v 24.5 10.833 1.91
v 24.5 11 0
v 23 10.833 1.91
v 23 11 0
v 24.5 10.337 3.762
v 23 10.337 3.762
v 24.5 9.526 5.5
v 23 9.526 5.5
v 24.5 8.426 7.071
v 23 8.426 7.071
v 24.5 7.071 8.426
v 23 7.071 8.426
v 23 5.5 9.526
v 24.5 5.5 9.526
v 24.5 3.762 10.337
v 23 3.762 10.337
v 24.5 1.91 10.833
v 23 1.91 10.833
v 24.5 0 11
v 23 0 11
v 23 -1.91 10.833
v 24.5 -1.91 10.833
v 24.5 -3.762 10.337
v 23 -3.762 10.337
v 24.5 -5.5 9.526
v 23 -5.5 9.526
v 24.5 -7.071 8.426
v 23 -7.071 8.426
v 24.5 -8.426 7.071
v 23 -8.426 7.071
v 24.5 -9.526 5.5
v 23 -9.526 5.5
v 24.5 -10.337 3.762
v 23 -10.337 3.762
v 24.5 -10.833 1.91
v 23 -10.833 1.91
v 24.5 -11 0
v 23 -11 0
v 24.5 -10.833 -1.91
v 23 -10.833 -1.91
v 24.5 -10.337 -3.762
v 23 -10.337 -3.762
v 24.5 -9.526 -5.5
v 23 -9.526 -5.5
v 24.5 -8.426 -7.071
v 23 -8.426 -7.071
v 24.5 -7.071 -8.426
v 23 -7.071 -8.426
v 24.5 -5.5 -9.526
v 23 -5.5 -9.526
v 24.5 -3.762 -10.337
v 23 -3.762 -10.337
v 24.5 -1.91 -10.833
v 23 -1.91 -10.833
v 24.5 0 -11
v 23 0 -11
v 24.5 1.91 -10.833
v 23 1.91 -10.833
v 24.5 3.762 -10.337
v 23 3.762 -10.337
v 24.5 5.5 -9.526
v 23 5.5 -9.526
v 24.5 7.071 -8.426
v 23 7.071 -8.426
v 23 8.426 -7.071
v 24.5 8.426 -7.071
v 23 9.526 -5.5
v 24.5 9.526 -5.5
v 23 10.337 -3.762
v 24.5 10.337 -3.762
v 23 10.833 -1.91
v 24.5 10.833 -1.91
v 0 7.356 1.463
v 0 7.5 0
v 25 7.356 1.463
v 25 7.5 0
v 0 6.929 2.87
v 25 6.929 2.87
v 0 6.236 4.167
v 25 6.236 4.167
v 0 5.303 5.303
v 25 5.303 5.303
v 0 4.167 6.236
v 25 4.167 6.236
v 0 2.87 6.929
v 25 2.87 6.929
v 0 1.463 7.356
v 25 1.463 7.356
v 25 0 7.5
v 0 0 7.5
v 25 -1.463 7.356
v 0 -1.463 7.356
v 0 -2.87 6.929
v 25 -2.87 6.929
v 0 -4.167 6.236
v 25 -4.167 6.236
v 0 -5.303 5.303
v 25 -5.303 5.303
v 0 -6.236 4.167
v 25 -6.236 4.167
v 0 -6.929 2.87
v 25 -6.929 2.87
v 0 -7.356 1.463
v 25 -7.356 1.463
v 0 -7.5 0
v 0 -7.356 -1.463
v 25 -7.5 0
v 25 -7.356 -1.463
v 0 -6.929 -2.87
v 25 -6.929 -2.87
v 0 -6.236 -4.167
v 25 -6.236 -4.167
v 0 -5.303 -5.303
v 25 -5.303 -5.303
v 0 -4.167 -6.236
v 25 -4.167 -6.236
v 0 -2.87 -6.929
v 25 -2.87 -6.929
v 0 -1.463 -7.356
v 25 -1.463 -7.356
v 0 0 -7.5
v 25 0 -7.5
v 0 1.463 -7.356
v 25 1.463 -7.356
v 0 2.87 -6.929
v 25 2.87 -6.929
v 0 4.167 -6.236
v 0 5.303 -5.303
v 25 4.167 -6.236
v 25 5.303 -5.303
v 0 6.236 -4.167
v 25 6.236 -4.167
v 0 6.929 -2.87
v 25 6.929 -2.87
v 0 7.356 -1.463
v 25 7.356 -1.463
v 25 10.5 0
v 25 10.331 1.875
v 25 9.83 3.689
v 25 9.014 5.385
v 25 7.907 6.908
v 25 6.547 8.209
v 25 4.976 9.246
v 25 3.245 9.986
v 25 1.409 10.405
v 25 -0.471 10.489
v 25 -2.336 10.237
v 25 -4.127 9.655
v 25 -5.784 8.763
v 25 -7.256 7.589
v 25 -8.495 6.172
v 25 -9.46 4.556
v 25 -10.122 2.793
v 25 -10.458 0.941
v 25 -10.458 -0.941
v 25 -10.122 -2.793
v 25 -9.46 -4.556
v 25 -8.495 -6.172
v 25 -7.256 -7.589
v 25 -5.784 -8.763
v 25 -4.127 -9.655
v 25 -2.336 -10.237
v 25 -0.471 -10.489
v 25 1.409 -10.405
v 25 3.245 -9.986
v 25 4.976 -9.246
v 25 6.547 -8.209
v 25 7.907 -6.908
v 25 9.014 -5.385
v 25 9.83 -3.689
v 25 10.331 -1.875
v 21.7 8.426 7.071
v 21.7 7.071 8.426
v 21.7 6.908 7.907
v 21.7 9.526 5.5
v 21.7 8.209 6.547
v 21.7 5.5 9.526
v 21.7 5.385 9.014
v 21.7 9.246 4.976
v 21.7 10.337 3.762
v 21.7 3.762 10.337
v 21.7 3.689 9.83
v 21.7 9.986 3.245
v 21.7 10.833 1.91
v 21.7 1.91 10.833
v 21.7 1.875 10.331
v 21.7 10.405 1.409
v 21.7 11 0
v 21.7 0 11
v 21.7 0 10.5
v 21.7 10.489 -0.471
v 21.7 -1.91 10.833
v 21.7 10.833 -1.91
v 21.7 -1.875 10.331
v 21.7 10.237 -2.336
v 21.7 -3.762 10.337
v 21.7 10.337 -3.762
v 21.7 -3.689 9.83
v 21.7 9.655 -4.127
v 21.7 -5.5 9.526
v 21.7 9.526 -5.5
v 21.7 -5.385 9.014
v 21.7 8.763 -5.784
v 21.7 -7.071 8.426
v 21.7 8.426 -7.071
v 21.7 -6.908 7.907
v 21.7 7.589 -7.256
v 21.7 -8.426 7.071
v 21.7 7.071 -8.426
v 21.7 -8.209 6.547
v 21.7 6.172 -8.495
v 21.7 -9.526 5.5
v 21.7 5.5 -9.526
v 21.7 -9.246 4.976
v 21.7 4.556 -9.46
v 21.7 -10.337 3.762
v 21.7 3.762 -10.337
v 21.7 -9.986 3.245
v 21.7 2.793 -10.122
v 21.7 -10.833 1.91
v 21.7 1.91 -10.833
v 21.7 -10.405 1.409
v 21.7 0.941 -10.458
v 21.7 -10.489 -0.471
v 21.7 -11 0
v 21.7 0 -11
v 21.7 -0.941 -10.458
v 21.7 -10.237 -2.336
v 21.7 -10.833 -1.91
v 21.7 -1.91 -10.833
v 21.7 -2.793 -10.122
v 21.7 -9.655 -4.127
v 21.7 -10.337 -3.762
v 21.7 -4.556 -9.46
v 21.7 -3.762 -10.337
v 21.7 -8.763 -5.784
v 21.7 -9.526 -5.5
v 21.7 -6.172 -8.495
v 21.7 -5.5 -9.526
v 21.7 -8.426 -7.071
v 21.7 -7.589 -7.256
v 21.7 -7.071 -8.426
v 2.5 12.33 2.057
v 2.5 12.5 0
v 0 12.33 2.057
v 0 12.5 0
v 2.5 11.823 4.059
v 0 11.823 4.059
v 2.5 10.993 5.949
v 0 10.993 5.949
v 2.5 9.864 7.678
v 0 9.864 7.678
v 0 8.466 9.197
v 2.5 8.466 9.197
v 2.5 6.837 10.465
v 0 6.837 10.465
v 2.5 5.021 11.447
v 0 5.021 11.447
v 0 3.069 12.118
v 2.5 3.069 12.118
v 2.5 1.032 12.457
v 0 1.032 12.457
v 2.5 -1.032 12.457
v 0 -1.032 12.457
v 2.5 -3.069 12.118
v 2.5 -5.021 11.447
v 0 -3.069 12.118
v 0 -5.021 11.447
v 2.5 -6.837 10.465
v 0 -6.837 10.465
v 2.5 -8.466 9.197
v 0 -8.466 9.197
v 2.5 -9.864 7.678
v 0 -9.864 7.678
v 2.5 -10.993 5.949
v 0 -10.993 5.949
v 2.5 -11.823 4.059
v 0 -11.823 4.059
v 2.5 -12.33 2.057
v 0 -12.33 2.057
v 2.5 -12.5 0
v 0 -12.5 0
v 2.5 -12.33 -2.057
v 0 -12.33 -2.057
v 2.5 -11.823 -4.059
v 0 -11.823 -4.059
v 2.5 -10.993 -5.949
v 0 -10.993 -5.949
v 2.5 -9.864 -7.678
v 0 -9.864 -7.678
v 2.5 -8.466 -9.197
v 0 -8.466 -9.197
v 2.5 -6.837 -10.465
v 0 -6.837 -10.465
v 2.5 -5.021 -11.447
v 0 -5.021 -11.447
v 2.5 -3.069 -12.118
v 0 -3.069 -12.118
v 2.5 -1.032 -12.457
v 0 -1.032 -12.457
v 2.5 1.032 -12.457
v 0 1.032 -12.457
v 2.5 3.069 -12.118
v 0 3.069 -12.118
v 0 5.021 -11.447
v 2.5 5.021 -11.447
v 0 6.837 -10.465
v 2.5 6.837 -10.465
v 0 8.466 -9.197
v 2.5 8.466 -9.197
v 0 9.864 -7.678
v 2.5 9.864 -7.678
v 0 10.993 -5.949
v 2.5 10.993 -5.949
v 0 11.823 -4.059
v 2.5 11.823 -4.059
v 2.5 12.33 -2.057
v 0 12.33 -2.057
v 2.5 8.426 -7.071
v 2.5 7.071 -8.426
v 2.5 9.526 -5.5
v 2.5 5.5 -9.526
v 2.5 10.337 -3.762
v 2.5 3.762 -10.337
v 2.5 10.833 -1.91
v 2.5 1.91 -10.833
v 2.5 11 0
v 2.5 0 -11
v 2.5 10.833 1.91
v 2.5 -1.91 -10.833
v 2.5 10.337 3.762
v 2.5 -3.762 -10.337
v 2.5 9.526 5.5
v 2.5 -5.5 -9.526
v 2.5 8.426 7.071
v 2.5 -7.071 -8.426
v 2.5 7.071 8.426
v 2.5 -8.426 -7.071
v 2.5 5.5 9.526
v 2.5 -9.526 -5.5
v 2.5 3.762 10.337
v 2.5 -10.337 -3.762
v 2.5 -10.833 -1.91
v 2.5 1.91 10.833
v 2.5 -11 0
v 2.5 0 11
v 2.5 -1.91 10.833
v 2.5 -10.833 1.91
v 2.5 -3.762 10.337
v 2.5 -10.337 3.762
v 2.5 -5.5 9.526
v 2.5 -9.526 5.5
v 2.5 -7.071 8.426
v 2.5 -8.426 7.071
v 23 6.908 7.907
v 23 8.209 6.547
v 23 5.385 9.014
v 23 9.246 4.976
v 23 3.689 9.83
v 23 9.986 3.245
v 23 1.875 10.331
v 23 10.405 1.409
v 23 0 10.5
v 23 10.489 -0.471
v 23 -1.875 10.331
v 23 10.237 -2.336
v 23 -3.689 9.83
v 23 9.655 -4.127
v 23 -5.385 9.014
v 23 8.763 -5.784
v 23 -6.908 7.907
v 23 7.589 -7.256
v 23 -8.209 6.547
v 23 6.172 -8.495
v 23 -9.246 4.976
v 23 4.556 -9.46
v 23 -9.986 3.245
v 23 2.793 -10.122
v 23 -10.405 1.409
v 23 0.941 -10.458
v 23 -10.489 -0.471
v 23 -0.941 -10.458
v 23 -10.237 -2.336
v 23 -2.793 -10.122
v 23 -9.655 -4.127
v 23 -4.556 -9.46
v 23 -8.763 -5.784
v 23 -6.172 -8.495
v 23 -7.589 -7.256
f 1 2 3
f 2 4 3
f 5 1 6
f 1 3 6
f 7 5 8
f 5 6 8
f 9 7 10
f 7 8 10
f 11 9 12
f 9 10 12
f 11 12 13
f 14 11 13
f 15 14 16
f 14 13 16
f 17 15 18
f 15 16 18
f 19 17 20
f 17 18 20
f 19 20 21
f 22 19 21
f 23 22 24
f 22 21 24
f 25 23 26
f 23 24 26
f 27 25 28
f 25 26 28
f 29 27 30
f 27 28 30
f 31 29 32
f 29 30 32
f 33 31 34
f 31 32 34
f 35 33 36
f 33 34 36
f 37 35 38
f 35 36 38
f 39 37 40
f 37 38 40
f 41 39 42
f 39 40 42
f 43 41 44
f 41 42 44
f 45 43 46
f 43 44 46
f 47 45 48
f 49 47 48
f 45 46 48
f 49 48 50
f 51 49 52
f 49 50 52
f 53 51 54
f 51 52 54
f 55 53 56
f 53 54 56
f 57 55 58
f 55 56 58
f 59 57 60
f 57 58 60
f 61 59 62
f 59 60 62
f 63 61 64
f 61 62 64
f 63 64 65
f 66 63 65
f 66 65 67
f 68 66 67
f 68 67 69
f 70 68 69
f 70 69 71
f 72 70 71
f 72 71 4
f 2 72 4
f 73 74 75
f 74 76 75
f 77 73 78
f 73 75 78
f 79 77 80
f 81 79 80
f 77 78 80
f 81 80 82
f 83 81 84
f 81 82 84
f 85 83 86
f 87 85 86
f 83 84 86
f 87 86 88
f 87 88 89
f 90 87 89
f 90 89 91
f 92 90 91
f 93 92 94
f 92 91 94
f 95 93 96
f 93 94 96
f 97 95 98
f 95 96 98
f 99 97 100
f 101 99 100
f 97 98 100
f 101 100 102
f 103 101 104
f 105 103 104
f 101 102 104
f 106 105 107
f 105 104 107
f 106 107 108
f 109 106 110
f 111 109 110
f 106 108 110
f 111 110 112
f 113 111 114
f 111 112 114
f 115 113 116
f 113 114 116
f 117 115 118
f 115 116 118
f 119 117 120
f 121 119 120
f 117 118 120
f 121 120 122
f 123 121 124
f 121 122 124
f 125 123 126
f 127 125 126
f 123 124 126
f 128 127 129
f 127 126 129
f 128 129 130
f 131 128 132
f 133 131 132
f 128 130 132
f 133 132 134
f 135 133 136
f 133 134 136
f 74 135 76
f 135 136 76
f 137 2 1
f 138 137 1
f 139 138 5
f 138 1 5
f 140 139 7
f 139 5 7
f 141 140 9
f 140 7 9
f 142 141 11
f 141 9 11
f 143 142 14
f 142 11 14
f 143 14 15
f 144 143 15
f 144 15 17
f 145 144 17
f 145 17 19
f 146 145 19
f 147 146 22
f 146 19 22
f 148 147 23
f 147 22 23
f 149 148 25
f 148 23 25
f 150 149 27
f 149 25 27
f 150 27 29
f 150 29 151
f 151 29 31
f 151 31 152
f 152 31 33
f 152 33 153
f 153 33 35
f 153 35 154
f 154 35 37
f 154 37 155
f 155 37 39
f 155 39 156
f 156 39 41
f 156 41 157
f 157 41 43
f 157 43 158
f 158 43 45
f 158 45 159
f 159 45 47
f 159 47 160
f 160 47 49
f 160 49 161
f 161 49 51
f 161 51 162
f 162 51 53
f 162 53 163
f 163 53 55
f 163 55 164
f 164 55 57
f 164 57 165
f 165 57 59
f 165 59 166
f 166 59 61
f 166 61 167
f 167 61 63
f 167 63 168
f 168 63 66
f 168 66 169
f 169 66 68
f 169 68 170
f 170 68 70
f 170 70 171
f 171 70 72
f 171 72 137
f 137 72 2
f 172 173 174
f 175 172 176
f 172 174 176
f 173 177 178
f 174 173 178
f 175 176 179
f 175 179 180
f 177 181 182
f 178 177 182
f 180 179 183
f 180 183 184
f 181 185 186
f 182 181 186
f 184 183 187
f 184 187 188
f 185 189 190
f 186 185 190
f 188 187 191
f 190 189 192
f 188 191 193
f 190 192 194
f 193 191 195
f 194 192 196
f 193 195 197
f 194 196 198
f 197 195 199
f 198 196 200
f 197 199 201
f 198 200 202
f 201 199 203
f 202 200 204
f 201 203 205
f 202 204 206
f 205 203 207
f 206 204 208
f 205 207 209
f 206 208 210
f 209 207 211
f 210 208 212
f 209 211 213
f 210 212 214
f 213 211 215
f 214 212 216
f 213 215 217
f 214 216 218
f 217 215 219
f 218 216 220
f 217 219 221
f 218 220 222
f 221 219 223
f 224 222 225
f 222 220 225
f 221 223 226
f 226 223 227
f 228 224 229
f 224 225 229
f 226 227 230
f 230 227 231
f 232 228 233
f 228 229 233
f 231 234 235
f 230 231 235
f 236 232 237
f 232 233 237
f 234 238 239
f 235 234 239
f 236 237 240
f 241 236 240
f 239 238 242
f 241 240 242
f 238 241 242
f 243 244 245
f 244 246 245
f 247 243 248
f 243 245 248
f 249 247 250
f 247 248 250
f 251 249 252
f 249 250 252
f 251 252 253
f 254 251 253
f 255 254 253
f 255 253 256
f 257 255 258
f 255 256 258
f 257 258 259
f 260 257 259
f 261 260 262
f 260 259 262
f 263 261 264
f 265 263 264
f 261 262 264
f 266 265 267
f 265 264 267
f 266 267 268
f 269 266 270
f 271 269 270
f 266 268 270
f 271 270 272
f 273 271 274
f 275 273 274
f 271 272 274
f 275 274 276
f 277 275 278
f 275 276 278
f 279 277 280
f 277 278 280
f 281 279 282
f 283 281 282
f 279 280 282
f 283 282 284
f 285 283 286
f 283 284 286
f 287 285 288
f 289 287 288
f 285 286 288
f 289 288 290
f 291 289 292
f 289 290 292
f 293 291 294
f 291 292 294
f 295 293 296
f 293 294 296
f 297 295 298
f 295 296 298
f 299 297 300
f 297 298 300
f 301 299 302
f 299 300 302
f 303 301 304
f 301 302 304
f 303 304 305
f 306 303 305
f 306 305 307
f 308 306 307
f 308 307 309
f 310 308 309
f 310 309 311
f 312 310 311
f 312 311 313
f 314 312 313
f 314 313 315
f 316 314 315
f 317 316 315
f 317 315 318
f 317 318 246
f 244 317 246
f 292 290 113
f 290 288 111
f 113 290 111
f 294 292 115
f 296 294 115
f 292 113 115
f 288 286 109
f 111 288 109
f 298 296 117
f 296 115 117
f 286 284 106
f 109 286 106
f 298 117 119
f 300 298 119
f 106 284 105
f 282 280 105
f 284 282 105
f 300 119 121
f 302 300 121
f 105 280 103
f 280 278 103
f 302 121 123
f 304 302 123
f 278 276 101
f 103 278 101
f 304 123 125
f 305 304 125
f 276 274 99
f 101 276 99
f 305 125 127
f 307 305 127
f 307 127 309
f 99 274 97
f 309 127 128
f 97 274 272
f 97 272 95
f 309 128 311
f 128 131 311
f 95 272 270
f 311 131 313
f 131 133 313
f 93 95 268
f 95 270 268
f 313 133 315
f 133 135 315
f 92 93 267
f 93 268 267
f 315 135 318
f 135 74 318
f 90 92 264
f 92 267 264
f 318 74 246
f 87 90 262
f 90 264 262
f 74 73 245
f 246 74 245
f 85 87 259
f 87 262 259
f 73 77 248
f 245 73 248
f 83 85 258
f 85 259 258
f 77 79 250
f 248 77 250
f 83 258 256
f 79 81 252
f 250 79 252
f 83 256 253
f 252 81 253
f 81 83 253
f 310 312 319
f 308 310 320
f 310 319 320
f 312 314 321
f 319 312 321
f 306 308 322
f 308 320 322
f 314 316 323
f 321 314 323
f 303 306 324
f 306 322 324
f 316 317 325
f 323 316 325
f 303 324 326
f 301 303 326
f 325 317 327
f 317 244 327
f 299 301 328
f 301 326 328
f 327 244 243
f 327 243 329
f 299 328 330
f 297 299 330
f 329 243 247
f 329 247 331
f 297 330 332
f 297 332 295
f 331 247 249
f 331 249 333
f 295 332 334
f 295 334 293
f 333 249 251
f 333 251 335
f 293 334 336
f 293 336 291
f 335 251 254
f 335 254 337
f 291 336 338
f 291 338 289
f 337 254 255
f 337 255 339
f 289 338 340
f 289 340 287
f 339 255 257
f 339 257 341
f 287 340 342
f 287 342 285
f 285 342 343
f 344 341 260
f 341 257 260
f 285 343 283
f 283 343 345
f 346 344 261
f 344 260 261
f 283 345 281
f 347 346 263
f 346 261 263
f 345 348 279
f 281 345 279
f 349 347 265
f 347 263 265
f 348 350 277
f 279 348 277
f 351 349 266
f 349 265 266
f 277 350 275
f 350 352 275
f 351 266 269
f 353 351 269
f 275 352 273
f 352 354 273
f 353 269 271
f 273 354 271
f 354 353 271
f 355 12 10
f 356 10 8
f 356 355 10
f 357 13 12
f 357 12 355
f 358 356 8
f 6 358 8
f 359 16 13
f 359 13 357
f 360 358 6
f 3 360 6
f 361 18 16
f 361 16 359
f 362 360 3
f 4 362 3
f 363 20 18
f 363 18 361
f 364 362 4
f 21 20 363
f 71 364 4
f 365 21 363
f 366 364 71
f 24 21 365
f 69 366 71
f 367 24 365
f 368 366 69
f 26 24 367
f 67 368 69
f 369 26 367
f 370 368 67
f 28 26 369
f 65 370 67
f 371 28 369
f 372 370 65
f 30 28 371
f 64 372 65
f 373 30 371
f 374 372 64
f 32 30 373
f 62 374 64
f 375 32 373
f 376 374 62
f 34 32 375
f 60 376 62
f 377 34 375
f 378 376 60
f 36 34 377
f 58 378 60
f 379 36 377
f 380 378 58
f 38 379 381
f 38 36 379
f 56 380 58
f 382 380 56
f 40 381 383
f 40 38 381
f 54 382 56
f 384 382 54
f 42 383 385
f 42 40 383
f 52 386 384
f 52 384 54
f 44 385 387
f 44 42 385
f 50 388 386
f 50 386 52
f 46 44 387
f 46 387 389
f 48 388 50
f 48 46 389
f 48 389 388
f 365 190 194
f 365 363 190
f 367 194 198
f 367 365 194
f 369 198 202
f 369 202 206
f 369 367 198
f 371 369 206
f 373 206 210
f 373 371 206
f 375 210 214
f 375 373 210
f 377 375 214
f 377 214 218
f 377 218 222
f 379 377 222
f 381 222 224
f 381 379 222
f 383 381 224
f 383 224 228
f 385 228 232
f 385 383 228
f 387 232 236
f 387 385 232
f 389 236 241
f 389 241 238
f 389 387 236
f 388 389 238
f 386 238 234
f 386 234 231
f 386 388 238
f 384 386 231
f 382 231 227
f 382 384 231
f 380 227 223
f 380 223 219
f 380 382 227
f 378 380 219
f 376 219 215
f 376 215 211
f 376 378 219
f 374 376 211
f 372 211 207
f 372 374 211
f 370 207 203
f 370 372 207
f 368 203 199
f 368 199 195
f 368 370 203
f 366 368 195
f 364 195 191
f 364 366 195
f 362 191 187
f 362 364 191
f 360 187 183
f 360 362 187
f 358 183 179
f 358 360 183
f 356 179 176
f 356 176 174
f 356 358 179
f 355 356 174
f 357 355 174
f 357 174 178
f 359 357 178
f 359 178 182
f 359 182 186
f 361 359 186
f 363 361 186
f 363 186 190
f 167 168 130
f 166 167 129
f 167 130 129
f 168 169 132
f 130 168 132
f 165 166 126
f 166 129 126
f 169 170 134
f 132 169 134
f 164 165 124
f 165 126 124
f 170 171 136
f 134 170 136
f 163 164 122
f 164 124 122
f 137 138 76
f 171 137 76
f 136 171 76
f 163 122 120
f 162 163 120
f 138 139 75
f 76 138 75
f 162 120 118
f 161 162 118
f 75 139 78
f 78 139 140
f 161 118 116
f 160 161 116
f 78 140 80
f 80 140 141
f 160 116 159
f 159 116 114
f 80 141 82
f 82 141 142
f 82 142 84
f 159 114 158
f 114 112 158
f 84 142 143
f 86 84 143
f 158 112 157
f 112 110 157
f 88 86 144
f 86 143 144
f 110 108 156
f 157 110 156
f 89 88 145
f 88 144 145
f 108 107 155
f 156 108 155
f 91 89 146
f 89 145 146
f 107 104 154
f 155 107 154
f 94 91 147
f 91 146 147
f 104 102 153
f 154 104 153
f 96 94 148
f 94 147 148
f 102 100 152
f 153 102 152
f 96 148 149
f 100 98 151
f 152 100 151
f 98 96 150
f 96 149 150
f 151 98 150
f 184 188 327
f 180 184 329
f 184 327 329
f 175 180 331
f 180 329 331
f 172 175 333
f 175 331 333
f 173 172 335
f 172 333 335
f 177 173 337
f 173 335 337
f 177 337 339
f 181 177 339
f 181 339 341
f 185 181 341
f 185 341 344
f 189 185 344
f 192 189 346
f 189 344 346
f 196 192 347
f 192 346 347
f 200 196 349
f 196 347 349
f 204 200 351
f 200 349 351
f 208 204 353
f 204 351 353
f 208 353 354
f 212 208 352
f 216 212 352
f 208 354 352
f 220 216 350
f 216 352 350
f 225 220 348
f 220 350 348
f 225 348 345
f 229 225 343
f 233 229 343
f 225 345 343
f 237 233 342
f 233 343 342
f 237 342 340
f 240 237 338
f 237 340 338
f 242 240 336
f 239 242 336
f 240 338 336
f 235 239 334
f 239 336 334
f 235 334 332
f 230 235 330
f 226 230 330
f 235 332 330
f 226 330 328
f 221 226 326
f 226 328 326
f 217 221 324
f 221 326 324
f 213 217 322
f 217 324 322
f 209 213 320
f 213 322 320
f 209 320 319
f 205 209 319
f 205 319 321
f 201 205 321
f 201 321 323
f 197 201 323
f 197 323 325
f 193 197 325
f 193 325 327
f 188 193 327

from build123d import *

# Parameters (mm, degrees)
F2_SIZE = 0.5
F3_W    = 1.3
F3_H    = 0.5


with BuildPart() as f1:
    # F0 (on Top) → F1 (revolve)
    with BuildSketch(Plane.XY):
        Polygon((0, 12.5), (0, 7.5), (25, 7.5), (25, 11), (2.5, 11), (2.5, 12.5), align=None)
    revolve(axis=Axis((6.446342, 0, 0), (1, 0, 0)))

    # F2
    f2_edges = [f1.edges().sort_by_distance(p)[0] for p in [
        (25, -11, 0),
    ]]
    chamfer(f2_edges, length=F2_SIZE)

    # F3 (on Front) → F4 (revolve, cut)
    with BuildSketch(Plane.XZ):
        with Locations((22.35, 10.75)):
            Rectangle(F3_W, F3_H)
    revolve(axis=Axis((15.843794, 0, 0), (1, 0, 0)), mode=Mode.SUBTRACT)


solid = f1.part
